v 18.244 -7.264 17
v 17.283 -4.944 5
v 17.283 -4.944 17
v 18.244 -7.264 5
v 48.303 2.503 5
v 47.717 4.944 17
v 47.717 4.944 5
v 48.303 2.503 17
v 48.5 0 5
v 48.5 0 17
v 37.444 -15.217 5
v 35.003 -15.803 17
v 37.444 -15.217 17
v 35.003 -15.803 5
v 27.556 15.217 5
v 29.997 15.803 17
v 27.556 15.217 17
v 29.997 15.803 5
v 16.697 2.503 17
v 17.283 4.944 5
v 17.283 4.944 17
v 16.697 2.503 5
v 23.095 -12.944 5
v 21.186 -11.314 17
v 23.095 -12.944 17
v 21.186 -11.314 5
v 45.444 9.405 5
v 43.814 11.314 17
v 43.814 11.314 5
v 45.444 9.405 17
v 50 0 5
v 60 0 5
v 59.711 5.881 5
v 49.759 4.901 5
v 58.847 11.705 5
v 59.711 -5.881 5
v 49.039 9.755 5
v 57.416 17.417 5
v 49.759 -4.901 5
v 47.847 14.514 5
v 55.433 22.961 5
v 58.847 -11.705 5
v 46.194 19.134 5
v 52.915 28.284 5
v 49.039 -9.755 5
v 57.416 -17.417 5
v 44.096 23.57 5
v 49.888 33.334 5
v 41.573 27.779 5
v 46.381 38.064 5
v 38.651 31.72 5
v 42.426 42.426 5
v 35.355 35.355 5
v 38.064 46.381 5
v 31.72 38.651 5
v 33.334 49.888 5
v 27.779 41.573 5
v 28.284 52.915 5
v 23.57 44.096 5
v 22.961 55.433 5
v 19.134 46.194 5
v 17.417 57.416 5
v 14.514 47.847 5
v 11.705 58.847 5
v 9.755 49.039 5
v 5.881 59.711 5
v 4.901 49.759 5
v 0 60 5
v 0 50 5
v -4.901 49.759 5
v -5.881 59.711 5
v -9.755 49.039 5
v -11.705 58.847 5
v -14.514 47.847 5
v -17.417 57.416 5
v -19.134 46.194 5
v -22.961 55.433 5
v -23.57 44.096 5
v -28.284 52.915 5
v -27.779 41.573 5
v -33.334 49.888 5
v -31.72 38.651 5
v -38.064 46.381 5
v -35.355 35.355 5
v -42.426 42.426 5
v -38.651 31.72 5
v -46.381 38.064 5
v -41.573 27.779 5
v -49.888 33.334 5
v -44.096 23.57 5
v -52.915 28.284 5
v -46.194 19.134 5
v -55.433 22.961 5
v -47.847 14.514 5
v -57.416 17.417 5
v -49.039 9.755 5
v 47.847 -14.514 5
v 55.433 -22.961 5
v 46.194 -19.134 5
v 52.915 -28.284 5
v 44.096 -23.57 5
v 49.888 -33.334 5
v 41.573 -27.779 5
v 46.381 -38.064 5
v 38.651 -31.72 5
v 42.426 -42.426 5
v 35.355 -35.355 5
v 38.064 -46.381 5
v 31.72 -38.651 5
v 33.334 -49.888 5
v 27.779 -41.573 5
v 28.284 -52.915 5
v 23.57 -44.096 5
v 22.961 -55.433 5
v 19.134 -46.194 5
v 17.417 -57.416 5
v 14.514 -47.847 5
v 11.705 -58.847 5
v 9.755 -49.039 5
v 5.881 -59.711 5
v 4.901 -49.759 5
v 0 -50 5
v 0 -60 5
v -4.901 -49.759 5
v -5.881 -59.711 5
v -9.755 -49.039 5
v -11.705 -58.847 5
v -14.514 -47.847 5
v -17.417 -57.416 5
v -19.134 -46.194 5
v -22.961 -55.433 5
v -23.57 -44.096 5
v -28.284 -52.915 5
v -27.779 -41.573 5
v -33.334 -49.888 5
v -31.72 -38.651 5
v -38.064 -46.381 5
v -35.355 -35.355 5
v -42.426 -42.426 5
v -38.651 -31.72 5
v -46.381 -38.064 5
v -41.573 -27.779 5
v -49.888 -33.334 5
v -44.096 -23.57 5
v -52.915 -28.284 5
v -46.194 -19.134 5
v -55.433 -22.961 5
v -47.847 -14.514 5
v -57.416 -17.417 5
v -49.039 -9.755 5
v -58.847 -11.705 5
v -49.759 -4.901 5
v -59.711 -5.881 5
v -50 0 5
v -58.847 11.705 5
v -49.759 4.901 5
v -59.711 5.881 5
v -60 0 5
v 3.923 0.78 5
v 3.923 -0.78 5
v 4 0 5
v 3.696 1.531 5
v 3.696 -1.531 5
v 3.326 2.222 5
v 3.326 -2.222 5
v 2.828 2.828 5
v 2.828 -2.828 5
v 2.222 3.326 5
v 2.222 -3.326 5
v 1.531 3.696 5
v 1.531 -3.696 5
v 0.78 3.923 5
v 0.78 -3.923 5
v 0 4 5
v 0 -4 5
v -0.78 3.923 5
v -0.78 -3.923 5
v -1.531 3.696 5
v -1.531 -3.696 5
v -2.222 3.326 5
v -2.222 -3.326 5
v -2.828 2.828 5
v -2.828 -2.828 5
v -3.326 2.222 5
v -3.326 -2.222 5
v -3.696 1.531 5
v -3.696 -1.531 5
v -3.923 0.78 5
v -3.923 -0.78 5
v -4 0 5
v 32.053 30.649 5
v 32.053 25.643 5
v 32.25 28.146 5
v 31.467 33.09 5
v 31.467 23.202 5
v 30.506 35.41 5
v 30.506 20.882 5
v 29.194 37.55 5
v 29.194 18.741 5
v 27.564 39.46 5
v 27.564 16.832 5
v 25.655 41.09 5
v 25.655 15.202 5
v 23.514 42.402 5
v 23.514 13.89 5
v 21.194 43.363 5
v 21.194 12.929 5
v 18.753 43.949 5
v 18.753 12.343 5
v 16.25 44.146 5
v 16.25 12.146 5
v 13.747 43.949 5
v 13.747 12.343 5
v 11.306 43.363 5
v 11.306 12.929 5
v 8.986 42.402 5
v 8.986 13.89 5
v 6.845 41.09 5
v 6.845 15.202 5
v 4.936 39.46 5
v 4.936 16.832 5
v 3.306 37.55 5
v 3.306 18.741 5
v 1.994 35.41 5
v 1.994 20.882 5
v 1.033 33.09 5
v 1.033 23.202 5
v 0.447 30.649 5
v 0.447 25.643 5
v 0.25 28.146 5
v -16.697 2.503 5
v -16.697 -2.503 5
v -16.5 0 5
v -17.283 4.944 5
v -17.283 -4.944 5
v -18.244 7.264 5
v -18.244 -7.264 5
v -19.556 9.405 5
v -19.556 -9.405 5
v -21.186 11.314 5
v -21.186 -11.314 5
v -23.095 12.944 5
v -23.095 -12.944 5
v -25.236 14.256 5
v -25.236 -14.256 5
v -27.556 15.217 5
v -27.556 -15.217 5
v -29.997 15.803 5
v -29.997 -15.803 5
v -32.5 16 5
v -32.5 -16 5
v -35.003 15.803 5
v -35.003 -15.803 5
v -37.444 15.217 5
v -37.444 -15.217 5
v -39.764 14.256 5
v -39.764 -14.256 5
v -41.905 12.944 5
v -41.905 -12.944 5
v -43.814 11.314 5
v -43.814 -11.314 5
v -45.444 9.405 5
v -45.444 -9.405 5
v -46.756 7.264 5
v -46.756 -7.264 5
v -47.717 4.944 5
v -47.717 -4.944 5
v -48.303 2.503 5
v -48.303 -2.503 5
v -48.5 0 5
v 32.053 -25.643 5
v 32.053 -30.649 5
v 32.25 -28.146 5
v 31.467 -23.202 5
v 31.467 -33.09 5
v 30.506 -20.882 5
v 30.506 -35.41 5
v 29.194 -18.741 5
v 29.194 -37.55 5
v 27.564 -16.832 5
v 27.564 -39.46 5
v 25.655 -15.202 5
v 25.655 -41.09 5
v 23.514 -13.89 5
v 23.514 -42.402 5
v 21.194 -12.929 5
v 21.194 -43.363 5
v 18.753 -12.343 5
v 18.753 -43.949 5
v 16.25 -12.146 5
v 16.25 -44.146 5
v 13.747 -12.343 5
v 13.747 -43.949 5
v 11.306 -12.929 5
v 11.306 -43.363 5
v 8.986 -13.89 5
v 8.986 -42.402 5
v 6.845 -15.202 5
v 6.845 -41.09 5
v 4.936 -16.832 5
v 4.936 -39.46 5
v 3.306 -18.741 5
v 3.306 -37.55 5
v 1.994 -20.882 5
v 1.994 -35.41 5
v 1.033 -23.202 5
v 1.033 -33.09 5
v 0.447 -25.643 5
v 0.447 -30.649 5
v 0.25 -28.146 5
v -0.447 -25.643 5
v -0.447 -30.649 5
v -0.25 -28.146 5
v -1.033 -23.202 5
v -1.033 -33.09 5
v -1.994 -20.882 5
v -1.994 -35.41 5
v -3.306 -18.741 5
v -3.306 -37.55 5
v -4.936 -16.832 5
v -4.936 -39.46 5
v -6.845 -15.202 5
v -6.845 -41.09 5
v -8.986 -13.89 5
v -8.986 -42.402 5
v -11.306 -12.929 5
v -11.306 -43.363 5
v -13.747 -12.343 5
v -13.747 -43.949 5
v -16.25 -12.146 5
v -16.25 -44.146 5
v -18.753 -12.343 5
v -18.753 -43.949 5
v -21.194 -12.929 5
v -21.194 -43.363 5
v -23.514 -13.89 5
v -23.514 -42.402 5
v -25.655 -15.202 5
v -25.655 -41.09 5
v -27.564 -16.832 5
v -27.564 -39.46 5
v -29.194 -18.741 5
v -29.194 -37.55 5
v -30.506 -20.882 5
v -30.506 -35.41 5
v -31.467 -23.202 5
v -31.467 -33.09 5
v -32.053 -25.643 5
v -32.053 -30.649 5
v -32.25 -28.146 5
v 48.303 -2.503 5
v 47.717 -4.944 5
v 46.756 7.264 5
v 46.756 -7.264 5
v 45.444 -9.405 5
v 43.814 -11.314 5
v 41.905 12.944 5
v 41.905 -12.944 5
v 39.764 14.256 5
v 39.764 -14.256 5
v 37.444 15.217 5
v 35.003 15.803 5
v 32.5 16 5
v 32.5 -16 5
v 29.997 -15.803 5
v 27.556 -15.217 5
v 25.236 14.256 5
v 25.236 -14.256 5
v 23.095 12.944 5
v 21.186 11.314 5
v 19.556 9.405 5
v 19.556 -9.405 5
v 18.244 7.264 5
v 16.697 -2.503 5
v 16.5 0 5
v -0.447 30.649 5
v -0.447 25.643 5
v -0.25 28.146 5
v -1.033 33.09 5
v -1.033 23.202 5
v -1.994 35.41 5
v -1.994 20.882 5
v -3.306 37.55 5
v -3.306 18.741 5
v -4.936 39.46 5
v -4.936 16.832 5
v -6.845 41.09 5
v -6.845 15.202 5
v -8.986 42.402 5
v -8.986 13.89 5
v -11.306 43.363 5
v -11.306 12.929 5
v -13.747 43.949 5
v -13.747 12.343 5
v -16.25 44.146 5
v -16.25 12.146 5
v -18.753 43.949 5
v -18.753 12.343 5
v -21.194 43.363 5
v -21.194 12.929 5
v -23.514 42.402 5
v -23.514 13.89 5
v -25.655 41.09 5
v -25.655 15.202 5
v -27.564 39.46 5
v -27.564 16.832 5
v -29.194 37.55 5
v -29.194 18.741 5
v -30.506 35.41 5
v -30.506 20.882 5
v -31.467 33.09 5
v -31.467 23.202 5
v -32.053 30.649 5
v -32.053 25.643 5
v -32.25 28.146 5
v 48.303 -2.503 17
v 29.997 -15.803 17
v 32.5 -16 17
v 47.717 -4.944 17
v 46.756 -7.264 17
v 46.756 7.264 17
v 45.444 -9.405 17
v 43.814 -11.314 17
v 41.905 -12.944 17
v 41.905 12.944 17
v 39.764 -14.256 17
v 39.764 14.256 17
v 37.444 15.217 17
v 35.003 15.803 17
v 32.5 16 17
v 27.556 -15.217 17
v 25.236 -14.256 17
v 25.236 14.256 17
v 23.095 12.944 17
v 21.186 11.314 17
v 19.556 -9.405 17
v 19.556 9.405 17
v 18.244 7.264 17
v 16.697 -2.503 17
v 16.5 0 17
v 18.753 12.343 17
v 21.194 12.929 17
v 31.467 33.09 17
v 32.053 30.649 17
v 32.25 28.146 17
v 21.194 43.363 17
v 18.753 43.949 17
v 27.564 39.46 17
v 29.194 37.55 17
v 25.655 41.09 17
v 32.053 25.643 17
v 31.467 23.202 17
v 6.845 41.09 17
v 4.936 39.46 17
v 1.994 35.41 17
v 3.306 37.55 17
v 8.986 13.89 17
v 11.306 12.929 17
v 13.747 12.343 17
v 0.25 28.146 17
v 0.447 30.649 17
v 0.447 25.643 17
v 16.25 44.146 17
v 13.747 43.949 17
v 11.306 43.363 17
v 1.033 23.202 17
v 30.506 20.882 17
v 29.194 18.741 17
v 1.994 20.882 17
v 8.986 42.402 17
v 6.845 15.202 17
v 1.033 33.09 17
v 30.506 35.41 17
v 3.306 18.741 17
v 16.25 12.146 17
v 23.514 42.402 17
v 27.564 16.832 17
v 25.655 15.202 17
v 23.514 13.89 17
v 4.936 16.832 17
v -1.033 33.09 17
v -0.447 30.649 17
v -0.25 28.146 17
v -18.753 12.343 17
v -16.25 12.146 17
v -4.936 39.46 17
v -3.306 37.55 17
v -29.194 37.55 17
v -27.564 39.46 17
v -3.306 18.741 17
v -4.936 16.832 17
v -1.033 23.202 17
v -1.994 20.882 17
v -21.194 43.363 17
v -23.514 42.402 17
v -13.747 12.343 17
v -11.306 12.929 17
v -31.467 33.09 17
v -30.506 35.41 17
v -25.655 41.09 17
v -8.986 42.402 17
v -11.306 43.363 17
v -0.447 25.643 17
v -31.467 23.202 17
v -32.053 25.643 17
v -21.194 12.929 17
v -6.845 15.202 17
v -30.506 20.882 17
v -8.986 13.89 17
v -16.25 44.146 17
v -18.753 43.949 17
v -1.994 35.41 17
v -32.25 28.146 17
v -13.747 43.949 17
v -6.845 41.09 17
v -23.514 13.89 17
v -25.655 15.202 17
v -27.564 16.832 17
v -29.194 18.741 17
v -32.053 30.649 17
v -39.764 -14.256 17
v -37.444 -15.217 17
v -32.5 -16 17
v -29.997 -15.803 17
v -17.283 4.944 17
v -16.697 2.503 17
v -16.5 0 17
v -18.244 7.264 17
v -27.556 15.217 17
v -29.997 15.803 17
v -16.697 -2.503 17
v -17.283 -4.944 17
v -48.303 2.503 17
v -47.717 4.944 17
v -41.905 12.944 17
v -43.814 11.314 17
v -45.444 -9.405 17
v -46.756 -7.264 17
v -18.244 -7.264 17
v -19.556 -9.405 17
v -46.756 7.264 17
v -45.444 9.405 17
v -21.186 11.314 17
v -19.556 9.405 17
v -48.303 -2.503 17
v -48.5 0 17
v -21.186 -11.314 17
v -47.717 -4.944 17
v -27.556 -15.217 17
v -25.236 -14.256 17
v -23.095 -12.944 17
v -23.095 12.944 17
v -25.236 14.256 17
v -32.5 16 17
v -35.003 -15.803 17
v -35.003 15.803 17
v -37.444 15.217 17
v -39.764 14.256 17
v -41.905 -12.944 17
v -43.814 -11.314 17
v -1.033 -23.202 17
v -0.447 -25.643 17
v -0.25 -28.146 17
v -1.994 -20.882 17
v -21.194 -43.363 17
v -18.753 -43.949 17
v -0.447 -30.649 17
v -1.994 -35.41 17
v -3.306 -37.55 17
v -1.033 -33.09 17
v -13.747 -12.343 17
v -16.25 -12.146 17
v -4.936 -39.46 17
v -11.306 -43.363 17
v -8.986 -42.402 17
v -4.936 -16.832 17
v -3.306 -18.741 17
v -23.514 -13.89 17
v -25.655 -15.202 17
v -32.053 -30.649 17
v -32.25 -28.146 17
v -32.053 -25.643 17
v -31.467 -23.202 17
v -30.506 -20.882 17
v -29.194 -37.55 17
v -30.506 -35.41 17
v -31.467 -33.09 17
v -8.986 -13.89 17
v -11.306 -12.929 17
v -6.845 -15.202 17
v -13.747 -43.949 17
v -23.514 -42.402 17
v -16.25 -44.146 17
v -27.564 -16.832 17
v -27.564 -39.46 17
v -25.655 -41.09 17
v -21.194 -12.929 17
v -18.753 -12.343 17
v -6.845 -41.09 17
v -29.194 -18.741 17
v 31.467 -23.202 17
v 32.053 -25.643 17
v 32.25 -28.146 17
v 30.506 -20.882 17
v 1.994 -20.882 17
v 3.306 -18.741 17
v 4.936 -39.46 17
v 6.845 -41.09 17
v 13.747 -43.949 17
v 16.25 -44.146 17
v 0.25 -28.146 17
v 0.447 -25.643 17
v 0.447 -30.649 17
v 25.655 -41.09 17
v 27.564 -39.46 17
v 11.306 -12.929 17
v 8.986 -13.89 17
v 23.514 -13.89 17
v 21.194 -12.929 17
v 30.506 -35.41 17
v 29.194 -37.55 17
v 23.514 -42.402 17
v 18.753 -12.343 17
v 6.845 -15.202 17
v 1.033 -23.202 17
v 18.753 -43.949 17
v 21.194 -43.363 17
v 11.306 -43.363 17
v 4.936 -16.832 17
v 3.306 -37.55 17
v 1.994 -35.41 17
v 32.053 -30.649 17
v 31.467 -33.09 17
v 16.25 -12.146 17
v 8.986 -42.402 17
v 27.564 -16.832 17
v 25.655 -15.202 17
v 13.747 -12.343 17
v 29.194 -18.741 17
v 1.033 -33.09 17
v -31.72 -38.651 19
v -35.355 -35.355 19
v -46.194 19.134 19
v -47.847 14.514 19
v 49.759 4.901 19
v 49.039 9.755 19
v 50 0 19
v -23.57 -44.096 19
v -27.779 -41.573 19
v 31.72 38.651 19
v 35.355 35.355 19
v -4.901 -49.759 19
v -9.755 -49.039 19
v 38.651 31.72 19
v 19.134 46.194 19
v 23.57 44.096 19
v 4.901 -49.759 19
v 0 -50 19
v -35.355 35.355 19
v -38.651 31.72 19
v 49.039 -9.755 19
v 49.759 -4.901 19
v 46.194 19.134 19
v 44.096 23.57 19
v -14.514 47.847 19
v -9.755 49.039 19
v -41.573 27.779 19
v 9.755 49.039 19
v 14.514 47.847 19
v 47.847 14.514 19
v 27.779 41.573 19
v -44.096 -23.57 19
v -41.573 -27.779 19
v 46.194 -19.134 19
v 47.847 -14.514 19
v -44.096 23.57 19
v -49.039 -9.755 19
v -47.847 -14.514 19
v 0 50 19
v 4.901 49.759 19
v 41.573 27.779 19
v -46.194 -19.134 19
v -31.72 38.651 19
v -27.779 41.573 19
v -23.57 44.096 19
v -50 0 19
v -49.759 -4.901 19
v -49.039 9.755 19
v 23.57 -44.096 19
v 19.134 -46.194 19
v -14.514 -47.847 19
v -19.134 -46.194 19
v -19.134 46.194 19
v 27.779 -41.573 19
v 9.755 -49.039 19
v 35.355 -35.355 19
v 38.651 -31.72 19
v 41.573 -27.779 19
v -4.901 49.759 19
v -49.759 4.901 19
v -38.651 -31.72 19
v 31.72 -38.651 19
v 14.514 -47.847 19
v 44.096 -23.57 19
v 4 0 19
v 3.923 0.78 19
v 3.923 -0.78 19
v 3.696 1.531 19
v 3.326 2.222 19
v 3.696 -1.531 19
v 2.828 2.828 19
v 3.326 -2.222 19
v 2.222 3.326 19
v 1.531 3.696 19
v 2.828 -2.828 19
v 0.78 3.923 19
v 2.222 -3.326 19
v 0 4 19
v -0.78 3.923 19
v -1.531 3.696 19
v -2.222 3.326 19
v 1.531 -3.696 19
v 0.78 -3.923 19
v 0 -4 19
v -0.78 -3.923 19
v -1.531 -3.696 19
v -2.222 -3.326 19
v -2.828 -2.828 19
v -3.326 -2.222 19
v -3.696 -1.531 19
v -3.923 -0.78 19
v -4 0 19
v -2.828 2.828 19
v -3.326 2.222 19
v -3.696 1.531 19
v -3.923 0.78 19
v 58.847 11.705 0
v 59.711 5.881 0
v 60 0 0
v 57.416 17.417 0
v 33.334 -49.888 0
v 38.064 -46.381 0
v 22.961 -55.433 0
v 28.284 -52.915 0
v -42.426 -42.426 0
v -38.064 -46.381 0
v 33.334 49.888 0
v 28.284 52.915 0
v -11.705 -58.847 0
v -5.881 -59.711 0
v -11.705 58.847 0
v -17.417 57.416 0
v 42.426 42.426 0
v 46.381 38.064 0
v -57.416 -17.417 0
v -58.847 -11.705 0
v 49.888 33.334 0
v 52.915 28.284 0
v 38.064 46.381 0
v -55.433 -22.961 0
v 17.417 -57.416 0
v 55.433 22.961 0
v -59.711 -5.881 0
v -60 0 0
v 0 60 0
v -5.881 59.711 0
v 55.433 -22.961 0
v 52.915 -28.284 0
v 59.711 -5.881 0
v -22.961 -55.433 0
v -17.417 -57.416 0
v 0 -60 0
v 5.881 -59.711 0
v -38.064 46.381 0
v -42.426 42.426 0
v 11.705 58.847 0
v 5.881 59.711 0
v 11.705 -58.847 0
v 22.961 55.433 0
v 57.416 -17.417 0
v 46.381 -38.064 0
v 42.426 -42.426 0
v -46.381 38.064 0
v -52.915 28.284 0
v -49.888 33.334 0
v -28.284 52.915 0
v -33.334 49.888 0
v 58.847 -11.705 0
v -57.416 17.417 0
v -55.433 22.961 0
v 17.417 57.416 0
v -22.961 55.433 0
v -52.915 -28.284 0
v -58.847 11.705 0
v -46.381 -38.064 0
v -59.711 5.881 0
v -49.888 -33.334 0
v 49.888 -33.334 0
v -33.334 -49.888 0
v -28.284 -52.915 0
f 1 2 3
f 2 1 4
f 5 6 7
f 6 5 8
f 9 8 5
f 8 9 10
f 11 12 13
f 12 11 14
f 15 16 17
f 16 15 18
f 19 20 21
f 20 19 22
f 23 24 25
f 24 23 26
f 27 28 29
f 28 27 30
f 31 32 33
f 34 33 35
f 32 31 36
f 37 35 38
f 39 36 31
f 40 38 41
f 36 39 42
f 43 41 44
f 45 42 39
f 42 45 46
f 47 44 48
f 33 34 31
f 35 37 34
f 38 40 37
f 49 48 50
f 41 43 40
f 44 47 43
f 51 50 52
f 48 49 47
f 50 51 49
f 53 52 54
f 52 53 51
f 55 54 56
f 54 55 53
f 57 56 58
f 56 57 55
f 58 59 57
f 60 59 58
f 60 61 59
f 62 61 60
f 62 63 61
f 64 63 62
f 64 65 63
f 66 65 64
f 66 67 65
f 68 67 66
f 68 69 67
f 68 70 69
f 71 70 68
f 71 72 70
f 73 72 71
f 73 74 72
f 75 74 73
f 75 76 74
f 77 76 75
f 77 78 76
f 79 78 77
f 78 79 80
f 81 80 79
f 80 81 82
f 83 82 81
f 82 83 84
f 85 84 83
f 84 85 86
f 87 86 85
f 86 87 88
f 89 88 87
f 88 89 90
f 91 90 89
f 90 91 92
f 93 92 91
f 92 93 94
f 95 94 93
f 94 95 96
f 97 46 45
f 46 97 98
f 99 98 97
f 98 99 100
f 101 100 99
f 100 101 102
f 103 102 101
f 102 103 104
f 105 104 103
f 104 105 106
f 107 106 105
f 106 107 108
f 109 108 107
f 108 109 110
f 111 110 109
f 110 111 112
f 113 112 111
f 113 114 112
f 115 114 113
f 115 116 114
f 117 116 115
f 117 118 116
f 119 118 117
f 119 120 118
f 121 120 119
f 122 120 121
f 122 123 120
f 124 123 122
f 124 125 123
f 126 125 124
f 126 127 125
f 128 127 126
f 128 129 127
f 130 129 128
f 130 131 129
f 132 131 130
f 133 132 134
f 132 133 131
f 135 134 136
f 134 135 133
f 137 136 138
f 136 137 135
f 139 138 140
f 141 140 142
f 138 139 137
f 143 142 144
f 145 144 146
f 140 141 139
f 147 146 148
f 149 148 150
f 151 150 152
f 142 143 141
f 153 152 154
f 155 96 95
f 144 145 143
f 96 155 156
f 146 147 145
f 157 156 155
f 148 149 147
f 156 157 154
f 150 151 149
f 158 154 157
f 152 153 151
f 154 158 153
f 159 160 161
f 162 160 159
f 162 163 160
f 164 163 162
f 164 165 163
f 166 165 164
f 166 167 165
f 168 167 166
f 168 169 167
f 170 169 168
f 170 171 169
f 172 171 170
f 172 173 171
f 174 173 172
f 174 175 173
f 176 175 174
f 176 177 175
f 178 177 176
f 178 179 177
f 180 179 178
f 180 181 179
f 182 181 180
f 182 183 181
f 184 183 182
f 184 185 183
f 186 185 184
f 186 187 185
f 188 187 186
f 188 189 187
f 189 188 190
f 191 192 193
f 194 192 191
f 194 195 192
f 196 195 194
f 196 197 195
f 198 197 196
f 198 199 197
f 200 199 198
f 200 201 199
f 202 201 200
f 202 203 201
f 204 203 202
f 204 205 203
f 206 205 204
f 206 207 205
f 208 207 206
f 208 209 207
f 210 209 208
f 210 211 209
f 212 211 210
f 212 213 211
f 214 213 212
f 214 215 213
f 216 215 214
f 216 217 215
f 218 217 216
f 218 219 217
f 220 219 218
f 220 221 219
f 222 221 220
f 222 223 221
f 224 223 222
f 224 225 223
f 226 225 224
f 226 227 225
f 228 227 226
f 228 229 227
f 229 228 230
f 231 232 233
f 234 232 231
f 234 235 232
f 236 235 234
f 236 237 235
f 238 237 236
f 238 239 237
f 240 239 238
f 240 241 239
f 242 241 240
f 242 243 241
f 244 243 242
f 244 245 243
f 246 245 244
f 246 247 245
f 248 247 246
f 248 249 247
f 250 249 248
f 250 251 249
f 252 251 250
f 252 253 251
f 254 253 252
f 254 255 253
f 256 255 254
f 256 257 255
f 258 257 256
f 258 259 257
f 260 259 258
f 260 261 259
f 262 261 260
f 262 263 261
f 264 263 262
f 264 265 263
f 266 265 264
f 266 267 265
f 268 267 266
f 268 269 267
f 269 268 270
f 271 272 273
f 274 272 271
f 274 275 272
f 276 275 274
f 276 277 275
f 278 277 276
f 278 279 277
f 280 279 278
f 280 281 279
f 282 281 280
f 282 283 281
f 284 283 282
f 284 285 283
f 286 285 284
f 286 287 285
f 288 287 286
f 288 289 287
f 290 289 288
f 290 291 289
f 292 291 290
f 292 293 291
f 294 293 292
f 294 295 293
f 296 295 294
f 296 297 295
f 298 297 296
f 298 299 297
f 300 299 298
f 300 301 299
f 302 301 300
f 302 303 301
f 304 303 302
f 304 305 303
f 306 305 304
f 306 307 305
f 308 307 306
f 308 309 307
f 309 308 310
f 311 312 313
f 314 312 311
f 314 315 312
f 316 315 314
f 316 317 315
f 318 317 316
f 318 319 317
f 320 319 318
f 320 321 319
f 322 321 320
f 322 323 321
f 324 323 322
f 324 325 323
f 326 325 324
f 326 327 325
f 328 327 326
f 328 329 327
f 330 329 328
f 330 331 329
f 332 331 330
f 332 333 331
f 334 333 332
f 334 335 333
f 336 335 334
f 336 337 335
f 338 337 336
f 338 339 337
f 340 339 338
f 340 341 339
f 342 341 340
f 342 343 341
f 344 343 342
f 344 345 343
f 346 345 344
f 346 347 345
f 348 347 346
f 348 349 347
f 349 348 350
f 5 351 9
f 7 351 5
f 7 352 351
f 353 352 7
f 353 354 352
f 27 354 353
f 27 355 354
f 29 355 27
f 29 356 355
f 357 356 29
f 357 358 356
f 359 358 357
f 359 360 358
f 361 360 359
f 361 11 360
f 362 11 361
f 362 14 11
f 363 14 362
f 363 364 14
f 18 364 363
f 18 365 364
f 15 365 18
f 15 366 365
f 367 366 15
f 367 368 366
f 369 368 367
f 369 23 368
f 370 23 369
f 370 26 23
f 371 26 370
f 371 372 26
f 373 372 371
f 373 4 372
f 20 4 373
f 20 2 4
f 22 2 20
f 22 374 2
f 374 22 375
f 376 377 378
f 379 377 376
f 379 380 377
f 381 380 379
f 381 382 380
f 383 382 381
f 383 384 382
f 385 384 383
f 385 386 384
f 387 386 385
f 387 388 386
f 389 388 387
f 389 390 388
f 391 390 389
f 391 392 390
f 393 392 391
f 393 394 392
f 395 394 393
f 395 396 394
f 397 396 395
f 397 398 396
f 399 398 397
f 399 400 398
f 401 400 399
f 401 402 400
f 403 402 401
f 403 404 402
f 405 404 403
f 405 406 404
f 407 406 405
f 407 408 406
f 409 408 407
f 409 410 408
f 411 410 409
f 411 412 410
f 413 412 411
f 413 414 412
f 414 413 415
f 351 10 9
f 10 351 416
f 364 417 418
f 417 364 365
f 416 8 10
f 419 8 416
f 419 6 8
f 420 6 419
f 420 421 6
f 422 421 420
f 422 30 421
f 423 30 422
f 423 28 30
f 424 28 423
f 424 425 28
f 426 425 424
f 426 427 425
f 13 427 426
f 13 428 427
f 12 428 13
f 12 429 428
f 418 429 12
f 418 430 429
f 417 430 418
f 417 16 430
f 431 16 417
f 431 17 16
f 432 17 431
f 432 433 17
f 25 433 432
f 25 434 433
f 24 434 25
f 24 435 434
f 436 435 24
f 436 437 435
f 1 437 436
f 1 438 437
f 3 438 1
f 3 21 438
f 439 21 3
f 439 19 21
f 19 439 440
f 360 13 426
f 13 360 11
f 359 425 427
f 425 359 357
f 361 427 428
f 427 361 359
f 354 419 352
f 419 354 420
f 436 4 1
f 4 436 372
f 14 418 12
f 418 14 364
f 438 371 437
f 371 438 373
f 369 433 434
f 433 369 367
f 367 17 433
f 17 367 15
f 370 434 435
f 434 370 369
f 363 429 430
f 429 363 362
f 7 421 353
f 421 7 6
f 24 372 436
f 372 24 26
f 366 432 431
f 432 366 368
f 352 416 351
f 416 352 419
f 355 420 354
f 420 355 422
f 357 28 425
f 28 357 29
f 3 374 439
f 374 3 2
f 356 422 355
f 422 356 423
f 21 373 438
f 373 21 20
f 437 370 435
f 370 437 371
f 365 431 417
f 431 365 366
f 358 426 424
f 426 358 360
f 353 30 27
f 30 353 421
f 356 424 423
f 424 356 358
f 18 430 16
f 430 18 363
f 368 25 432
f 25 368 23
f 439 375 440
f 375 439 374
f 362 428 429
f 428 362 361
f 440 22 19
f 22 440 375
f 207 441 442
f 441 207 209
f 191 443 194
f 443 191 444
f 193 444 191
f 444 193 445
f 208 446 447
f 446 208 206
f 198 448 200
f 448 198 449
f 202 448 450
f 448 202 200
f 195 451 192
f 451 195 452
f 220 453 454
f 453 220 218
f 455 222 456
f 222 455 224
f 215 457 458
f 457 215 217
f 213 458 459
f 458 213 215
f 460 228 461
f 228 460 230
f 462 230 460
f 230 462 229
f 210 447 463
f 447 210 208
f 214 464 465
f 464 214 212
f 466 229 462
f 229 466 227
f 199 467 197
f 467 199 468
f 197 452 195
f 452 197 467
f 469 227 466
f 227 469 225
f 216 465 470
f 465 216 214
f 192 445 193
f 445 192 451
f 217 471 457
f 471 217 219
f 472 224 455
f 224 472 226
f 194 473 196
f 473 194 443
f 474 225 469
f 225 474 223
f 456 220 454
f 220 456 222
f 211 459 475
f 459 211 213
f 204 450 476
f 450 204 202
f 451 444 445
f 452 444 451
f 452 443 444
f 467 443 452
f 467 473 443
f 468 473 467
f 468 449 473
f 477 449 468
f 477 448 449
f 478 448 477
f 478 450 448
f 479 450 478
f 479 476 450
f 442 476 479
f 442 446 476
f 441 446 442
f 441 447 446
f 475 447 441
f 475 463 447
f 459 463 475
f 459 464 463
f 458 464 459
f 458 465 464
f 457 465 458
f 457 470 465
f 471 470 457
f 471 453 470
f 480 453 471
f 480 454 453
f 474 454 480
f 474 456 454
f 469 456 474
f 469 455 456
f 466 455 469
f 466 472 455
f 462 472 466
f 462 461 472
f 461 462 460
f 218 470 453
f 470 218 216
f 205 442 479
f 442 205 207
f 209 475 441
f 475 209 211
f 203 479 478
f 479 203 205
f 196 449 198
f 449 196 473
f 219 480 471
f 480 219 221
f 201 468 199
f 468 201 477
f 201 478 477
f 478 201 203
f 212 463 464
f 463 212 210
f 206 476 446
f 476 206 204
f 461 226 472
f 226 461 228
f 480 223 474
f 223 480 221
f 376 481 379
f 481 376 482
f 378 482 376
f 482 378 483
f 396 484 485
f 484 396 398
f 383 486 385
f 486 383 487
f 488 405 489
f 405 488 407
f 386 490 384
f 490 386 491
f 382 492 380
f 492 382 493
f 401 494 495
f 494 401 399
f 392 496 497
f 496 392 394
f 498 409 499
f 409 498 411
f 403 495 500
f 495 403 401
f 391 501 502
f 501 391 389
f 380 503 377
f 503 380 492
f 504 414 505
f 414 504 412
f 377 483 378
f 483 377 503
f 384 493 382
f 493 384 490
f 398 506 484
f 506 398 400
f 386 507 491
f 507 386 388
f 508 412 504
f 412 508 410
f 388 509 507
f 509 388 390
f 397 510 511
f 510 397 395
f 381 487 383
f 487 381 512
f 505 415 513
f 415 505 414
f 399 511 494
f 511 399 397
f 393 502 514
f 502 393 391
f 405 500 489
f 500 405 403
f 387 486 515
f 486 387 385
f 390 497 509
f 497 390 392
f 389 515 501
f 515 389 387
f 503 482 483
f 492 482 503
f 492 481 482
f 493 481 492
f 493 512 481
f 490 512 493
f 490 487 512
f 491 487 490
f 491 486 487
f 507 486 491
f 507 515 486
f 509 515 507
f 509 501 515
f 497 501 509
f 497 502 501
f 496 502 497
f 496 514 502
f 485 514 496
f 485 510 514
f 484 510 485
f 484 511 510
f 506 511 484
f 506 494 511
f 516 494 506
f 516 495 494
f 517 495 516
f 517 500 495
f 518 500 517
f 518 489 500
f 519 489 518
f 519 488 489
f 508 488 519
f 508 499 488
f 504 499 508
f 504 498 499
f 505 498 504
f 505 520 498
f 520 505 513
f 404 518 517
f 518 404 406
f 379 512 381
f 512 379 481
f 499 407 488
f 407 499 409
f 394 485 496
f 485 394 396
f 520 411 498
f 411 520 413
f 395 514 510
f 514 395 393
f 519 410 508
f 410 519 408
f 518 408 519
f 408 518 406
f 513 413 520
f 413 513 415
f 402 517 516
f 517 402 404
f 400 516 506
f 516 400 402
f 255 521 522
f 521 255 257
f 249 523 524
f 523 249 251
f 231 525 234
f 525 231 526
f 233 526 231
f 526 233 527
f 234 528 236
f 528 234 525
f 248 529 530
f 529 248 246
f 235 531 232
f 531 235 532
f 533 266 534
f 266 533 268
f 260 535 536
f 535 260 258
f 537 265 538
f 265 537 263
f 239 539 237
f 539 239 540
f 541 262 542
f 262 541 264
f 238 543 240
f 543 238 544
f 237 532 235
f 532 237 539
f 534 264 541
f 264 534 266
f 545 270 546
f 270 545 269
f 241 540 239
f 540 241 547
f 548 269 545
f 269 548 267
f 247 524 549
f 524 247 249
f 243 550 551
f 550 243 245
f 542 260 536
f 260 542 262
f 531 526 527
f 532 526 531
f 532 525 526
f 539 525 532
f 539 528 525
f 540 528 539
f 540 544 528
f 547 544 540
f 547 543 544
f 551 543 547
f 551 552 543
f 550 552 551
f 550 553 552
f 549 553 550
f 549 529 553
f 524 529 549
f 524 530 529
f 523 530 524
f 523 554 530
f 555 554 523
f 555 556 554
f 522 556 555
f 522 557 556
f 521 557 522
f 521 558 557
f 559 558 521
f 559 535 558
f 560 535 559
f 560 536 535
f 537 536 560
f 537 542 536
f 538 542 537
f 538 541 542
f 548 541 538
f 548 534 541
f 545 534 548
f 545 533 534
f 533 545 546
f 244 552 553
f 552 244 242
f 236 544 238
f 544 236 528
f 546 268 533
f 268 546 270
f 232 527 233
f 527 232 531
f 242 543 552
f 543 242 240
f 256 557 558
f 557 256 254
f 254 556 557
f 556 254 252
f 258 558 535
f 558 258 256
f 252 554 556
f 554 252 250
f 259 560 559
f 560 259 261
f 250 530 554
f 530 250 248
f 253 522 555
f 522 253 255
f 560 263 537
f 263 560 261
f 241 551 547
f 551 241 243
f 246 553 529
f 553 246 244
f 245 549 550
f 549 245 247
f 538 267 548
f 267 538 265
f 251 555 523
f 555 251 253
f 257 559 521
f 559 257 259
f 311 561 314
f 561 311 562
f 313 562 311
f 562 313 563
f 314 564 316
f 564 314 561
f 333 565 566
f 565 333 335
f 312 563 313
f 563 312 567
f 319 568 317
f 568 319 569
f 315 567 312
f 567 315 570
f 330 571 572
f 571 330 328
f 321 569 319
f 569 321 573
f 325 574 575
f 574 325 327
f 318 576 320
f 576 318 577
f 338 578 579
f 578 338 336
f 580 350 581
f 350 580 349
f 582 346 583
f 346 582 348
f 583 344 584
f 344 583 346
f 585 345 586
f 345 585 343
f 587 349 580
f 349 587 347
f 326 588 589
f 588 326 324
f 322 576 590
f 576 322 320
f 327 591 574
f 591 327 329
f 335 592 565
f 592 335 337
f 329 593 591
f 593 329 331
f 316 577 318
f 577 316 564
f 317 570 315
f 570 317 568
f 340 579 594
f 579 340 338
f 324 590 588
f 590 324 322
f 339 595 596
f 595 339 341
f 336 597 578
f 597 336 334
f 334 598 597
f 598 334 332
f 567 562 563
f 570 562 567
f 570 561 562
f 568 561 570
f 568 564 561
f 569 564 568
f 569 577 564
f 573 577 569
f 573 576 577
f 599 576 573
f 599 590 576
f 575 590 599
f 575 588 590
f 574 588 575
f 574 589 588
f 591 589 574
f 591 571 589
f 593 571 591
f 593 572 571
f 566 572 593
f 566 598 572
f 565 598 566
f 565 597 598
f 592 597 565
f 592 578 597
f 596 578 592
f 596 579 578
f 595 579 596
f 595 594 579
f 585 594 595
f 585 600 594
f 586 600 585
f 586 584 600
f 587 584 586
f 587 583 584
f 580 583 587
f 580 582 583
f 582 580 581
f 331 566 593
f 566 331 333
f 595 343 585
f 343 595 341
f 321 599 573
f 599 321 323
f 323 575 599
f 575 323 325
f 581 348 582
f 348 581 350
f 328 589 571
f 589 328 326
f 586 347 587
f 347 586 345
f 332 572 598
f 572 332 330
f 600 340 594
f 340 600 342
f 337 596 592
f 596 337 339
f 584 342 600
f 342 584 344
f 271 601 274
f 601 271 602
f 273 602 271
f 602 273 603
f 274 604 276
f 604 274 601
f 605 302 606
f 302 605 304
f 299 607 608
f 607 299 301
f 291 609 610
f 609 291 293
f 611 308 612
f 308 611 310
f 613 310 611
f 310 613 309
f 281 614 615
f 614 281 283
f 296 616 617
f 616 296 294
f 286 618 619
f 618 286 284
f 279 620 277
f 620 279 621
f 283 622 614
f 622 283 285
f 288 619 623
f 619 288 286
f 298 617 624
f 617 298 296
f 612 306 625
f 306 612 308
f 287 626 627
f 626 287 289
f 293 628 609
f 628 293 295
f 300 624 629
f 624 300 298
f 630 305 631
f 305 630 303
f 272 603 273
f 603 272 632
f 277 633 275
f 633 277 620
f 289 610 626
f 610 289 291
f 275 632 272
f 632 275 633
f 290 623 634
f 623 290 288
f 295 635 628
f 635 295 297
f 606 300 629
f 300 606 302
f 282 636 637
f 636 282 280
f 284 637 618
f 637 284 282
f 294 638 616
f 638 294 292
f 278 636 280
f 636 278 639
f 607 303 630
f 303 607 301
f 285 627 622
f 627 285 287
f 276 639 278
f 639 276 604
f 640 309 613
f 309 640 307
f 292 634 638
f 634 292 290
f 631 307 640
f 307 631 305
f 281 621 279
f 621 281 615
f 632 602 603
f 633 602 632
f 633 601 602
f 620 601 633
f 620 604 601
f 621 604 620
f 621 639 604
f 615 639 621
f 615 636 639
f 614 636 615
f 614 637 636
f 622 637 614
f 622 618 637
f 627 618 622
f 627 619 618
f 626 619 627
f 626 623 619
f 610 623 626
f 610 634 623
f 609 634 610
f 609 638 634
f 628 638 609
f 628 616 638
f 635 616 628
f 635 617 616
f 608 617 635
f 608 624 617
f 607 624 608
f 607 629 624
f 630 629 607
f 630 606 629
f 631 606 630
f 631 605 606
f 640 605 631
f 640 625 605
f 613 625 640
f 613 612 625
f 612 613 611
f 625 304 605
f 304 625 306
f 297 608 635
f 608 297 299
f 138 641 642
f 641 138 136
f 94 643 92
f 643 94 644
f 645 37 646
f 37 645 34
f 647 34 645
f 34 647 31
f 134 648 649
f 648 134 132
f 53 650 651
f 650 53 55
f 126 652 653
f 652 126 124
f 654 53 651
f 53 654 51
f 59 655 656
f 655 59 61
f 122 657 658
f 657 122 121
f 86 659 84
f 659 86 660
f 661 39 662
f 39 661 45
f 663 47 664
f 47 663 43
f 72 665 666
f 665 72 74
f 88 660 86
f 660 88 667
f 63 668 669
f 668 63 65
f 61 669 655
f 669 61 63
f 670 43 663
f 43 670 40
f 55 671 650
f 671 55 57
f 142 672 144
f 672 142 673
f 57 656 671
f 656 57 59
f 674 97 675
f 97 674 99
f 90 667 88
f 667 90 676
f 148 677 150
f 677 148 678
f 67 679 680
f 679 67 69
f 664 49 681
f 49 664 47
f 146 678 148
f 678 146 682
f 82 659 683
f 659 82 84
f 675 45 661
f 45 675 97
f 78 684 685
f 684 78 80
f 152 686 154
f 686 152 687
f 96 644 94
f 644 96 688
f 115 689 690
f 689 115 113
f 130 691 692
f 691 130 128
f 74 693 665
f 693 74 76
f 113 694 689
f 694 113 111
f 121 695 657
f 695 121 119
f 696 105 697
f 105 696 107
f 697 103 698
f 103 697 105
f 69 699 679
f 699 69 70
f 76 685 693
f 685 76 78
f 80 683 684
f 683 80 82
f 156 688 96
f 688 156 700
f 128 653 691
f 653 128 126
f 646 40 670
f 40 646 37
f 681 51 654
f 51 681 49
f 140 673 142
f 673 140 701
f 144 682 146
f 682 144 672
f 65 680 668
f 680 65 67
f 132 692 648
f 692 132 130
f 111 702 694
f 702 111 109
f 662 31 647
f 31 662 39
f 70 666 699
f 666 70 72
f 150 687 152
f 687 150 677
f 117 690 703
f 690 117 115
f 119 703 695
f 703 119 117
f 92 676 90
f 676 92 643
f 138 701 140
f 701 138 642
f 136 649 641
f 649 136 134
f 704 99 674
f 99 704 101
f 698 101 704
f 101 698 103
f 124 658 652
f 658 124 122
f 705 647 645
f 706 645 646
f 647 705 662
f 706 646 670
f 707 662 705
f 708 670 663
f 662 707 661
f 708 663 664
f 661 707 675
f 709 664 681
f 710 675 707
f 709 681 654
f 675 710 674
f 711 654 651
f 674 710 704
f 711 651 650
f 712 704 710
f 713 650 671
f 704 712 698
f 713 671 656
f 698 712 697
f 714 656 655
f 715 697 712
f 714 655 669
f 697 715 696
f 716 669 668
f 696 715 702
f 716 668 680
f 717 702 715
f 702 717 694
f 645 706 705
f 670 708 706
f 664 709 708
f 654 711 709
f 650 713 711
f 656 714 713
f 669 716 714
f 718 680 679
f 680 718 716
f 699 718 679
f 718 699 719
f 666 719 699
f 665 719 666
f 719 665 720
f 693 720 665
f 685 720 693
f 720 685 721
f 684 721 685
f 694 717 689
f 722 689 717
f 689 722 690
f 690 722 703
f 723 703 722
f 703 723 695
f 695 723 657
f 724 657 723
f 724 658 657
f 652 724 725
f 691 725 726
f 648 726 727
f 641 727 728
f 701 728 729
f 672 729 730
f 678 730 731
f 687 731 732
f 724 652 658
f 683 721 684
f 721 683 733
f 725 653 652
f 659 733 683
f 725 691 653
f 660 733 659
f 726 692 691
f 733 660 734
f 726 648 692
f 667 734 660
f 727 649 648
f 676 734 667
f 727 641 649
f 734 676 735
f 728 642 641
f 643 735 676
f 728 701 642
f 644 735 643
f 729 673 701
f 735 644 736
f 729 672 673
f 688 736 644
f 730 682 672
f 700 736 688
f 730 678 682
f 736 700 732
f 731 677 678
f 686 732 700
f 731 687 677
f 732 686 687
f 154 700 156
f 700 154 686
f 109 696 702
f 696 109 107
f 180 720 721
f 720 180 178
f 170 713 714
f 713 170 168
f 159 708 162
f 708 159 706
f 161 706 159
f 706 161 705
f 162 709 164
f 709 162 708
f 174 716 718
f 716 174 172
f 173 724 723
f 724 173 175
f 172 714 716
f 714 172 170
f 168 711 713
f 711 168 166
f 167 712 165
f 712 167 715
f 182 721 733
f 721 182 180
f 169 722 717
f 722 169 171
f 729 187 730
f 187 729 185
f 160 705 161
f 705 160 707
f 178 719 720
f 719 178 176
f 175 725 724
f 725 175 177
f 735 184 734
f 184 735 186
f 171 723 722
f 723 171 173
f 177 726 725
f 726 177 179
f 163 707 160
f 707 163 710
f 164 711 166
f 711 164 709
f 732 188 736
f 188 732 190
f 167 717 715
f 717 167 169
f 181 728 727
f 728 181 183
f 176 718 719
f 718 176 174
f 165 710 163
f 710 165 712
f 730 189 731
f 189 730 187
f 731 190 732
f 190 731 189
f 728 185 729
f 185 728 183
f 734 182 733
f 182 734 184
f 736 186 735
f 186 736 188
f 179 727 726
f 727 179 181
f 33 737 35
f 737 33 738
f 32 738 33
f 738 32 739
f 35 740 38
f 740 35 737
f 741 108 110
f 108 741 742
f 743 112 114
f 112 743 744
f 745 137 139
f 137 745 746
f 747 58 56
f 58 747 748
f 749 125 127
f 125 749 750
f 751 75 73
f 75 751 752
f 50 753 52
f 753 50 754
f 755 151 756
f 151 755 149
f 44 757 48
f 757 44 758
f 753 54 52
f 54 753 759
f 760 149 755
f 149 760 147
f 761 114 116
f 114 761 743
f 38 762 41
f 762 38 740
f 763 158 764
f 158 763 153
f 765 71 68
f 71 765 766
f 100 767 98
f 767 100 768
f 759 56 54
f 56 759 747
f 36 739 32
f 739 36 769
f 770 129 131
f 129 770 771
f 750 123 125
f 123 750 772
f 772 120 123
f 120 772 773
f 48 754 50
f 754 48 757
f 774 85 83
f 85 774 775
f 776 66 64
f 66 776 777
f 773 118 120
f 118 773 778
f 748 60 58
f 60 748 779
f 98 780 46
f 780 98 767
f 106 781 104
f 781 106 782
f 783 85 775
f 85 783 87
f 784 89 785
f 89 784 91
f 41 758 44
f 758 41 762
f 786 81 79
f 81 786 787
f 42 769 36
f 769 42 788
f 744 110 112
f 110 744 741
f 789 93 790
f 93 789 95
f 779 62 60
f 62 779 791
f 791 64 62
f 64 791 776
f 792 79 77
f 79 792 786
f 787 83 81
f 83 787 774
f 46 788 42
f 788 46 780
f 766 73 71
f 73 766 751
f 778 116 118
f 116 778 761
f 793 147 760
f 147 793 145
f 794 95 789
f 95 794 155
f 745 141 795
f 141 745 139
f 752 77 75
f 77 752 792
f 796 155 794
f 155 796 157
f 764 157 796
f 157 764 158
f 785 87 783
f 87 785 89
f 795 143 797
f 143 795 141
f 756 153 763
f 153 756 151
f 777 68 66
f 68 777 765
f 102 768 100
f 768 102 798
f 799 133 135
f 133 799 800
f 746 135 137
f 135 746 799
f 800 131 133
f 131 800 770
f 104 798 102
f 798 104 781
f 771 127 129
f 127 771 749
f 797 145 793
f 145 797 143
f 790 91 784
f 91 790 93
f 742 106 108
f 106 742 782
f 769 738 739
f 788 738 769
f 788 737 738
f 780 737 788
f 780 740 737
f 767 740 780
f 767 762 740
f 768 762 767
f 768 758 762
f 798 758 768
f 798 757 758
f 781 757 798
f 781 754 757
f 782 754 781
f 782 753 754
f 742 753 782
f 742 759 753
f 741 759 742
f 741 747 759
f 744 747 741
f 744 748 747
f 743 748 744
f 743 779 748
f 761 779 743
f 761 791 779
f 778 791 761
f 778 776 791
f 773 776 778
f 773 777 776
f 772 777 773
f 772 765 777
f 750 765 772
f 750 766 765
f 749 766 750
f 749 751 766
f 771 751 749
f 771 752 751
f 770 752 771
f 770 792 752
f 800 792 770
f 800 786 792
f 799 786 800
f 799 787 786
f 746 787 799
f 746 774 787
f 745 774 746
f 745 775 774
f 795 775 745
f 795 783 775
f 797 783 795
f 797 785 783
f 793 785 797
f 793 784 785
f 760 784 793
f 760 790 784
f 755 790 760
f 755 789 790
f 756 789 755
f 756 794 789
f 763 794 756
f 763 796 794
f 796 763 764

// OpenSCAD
// Parametric 6-slot component storage magazine for the MyZubster mother robot.
// Rotating Geneva-style disk that indexes components to the assembly position.
// Issue #78 task: Magazzino componenti (motori, sensori, schede).
// Print in PETG, 80% infill; drive with a 28BYJ-48 stepper (4096 steps/rev).

// Parameters (mm)
mag_disk_od = 100;          // magazine disk outer diameter
mag_disk_h = 14;           // disk thickness
slot_count = 6;            // number of component slots
slot_od = 32;              // slot opening diameter (fits ESP32 module + N20 motor)
slot_depth = 12;          // slot depth into the disk
shaft_dia = 8;             // central shaft diameter (stepper coupling)
rim_t = 4;                 // wall thickness around each slot
base_flange_d = 120;       // mounting flange diameter
base_flange_h = 5;        // flange thickness

$fn = 64;

module component_magazine() {
  // mounting flange
  cylinder(h = base_flange_h, d = base_flange_d);
  // main disk
  translate([0, 0, base_flange_h])
    difference() {
      cylinder(h = mag_disk_h, d = mag_disk_od);
      // central shaft hole
      cylinder(h = mag_disk_h + 2, d = shaft_dia, $fn = 32);
      // component slots around the perimeter
      for (i = [0 : slot_count - 1]) {
        angle = 360 * i / slot_count;
        translate([mag_disk_od / 2 * 0.65 * cos(angle), mag_disk_od / 2 * 0.65 * sin(angle), 0])
          cylinder(h = slot_depth, d = slot_od, $fn = 40);
      }
      // M3 mounting holes in flange
      for (i = [0 : 3])
        rotate([0, 0, 90 * i + 45])
          translate([base_flange_d / 2 - 6, 0, 0])
            cylinder(h = base_flange_h + 2, d = 3.4, $fn = 20, center = true);
    }
}

component_magazine();
// Mount the flange into the right expansion rail; rotate the disk to index slots.
